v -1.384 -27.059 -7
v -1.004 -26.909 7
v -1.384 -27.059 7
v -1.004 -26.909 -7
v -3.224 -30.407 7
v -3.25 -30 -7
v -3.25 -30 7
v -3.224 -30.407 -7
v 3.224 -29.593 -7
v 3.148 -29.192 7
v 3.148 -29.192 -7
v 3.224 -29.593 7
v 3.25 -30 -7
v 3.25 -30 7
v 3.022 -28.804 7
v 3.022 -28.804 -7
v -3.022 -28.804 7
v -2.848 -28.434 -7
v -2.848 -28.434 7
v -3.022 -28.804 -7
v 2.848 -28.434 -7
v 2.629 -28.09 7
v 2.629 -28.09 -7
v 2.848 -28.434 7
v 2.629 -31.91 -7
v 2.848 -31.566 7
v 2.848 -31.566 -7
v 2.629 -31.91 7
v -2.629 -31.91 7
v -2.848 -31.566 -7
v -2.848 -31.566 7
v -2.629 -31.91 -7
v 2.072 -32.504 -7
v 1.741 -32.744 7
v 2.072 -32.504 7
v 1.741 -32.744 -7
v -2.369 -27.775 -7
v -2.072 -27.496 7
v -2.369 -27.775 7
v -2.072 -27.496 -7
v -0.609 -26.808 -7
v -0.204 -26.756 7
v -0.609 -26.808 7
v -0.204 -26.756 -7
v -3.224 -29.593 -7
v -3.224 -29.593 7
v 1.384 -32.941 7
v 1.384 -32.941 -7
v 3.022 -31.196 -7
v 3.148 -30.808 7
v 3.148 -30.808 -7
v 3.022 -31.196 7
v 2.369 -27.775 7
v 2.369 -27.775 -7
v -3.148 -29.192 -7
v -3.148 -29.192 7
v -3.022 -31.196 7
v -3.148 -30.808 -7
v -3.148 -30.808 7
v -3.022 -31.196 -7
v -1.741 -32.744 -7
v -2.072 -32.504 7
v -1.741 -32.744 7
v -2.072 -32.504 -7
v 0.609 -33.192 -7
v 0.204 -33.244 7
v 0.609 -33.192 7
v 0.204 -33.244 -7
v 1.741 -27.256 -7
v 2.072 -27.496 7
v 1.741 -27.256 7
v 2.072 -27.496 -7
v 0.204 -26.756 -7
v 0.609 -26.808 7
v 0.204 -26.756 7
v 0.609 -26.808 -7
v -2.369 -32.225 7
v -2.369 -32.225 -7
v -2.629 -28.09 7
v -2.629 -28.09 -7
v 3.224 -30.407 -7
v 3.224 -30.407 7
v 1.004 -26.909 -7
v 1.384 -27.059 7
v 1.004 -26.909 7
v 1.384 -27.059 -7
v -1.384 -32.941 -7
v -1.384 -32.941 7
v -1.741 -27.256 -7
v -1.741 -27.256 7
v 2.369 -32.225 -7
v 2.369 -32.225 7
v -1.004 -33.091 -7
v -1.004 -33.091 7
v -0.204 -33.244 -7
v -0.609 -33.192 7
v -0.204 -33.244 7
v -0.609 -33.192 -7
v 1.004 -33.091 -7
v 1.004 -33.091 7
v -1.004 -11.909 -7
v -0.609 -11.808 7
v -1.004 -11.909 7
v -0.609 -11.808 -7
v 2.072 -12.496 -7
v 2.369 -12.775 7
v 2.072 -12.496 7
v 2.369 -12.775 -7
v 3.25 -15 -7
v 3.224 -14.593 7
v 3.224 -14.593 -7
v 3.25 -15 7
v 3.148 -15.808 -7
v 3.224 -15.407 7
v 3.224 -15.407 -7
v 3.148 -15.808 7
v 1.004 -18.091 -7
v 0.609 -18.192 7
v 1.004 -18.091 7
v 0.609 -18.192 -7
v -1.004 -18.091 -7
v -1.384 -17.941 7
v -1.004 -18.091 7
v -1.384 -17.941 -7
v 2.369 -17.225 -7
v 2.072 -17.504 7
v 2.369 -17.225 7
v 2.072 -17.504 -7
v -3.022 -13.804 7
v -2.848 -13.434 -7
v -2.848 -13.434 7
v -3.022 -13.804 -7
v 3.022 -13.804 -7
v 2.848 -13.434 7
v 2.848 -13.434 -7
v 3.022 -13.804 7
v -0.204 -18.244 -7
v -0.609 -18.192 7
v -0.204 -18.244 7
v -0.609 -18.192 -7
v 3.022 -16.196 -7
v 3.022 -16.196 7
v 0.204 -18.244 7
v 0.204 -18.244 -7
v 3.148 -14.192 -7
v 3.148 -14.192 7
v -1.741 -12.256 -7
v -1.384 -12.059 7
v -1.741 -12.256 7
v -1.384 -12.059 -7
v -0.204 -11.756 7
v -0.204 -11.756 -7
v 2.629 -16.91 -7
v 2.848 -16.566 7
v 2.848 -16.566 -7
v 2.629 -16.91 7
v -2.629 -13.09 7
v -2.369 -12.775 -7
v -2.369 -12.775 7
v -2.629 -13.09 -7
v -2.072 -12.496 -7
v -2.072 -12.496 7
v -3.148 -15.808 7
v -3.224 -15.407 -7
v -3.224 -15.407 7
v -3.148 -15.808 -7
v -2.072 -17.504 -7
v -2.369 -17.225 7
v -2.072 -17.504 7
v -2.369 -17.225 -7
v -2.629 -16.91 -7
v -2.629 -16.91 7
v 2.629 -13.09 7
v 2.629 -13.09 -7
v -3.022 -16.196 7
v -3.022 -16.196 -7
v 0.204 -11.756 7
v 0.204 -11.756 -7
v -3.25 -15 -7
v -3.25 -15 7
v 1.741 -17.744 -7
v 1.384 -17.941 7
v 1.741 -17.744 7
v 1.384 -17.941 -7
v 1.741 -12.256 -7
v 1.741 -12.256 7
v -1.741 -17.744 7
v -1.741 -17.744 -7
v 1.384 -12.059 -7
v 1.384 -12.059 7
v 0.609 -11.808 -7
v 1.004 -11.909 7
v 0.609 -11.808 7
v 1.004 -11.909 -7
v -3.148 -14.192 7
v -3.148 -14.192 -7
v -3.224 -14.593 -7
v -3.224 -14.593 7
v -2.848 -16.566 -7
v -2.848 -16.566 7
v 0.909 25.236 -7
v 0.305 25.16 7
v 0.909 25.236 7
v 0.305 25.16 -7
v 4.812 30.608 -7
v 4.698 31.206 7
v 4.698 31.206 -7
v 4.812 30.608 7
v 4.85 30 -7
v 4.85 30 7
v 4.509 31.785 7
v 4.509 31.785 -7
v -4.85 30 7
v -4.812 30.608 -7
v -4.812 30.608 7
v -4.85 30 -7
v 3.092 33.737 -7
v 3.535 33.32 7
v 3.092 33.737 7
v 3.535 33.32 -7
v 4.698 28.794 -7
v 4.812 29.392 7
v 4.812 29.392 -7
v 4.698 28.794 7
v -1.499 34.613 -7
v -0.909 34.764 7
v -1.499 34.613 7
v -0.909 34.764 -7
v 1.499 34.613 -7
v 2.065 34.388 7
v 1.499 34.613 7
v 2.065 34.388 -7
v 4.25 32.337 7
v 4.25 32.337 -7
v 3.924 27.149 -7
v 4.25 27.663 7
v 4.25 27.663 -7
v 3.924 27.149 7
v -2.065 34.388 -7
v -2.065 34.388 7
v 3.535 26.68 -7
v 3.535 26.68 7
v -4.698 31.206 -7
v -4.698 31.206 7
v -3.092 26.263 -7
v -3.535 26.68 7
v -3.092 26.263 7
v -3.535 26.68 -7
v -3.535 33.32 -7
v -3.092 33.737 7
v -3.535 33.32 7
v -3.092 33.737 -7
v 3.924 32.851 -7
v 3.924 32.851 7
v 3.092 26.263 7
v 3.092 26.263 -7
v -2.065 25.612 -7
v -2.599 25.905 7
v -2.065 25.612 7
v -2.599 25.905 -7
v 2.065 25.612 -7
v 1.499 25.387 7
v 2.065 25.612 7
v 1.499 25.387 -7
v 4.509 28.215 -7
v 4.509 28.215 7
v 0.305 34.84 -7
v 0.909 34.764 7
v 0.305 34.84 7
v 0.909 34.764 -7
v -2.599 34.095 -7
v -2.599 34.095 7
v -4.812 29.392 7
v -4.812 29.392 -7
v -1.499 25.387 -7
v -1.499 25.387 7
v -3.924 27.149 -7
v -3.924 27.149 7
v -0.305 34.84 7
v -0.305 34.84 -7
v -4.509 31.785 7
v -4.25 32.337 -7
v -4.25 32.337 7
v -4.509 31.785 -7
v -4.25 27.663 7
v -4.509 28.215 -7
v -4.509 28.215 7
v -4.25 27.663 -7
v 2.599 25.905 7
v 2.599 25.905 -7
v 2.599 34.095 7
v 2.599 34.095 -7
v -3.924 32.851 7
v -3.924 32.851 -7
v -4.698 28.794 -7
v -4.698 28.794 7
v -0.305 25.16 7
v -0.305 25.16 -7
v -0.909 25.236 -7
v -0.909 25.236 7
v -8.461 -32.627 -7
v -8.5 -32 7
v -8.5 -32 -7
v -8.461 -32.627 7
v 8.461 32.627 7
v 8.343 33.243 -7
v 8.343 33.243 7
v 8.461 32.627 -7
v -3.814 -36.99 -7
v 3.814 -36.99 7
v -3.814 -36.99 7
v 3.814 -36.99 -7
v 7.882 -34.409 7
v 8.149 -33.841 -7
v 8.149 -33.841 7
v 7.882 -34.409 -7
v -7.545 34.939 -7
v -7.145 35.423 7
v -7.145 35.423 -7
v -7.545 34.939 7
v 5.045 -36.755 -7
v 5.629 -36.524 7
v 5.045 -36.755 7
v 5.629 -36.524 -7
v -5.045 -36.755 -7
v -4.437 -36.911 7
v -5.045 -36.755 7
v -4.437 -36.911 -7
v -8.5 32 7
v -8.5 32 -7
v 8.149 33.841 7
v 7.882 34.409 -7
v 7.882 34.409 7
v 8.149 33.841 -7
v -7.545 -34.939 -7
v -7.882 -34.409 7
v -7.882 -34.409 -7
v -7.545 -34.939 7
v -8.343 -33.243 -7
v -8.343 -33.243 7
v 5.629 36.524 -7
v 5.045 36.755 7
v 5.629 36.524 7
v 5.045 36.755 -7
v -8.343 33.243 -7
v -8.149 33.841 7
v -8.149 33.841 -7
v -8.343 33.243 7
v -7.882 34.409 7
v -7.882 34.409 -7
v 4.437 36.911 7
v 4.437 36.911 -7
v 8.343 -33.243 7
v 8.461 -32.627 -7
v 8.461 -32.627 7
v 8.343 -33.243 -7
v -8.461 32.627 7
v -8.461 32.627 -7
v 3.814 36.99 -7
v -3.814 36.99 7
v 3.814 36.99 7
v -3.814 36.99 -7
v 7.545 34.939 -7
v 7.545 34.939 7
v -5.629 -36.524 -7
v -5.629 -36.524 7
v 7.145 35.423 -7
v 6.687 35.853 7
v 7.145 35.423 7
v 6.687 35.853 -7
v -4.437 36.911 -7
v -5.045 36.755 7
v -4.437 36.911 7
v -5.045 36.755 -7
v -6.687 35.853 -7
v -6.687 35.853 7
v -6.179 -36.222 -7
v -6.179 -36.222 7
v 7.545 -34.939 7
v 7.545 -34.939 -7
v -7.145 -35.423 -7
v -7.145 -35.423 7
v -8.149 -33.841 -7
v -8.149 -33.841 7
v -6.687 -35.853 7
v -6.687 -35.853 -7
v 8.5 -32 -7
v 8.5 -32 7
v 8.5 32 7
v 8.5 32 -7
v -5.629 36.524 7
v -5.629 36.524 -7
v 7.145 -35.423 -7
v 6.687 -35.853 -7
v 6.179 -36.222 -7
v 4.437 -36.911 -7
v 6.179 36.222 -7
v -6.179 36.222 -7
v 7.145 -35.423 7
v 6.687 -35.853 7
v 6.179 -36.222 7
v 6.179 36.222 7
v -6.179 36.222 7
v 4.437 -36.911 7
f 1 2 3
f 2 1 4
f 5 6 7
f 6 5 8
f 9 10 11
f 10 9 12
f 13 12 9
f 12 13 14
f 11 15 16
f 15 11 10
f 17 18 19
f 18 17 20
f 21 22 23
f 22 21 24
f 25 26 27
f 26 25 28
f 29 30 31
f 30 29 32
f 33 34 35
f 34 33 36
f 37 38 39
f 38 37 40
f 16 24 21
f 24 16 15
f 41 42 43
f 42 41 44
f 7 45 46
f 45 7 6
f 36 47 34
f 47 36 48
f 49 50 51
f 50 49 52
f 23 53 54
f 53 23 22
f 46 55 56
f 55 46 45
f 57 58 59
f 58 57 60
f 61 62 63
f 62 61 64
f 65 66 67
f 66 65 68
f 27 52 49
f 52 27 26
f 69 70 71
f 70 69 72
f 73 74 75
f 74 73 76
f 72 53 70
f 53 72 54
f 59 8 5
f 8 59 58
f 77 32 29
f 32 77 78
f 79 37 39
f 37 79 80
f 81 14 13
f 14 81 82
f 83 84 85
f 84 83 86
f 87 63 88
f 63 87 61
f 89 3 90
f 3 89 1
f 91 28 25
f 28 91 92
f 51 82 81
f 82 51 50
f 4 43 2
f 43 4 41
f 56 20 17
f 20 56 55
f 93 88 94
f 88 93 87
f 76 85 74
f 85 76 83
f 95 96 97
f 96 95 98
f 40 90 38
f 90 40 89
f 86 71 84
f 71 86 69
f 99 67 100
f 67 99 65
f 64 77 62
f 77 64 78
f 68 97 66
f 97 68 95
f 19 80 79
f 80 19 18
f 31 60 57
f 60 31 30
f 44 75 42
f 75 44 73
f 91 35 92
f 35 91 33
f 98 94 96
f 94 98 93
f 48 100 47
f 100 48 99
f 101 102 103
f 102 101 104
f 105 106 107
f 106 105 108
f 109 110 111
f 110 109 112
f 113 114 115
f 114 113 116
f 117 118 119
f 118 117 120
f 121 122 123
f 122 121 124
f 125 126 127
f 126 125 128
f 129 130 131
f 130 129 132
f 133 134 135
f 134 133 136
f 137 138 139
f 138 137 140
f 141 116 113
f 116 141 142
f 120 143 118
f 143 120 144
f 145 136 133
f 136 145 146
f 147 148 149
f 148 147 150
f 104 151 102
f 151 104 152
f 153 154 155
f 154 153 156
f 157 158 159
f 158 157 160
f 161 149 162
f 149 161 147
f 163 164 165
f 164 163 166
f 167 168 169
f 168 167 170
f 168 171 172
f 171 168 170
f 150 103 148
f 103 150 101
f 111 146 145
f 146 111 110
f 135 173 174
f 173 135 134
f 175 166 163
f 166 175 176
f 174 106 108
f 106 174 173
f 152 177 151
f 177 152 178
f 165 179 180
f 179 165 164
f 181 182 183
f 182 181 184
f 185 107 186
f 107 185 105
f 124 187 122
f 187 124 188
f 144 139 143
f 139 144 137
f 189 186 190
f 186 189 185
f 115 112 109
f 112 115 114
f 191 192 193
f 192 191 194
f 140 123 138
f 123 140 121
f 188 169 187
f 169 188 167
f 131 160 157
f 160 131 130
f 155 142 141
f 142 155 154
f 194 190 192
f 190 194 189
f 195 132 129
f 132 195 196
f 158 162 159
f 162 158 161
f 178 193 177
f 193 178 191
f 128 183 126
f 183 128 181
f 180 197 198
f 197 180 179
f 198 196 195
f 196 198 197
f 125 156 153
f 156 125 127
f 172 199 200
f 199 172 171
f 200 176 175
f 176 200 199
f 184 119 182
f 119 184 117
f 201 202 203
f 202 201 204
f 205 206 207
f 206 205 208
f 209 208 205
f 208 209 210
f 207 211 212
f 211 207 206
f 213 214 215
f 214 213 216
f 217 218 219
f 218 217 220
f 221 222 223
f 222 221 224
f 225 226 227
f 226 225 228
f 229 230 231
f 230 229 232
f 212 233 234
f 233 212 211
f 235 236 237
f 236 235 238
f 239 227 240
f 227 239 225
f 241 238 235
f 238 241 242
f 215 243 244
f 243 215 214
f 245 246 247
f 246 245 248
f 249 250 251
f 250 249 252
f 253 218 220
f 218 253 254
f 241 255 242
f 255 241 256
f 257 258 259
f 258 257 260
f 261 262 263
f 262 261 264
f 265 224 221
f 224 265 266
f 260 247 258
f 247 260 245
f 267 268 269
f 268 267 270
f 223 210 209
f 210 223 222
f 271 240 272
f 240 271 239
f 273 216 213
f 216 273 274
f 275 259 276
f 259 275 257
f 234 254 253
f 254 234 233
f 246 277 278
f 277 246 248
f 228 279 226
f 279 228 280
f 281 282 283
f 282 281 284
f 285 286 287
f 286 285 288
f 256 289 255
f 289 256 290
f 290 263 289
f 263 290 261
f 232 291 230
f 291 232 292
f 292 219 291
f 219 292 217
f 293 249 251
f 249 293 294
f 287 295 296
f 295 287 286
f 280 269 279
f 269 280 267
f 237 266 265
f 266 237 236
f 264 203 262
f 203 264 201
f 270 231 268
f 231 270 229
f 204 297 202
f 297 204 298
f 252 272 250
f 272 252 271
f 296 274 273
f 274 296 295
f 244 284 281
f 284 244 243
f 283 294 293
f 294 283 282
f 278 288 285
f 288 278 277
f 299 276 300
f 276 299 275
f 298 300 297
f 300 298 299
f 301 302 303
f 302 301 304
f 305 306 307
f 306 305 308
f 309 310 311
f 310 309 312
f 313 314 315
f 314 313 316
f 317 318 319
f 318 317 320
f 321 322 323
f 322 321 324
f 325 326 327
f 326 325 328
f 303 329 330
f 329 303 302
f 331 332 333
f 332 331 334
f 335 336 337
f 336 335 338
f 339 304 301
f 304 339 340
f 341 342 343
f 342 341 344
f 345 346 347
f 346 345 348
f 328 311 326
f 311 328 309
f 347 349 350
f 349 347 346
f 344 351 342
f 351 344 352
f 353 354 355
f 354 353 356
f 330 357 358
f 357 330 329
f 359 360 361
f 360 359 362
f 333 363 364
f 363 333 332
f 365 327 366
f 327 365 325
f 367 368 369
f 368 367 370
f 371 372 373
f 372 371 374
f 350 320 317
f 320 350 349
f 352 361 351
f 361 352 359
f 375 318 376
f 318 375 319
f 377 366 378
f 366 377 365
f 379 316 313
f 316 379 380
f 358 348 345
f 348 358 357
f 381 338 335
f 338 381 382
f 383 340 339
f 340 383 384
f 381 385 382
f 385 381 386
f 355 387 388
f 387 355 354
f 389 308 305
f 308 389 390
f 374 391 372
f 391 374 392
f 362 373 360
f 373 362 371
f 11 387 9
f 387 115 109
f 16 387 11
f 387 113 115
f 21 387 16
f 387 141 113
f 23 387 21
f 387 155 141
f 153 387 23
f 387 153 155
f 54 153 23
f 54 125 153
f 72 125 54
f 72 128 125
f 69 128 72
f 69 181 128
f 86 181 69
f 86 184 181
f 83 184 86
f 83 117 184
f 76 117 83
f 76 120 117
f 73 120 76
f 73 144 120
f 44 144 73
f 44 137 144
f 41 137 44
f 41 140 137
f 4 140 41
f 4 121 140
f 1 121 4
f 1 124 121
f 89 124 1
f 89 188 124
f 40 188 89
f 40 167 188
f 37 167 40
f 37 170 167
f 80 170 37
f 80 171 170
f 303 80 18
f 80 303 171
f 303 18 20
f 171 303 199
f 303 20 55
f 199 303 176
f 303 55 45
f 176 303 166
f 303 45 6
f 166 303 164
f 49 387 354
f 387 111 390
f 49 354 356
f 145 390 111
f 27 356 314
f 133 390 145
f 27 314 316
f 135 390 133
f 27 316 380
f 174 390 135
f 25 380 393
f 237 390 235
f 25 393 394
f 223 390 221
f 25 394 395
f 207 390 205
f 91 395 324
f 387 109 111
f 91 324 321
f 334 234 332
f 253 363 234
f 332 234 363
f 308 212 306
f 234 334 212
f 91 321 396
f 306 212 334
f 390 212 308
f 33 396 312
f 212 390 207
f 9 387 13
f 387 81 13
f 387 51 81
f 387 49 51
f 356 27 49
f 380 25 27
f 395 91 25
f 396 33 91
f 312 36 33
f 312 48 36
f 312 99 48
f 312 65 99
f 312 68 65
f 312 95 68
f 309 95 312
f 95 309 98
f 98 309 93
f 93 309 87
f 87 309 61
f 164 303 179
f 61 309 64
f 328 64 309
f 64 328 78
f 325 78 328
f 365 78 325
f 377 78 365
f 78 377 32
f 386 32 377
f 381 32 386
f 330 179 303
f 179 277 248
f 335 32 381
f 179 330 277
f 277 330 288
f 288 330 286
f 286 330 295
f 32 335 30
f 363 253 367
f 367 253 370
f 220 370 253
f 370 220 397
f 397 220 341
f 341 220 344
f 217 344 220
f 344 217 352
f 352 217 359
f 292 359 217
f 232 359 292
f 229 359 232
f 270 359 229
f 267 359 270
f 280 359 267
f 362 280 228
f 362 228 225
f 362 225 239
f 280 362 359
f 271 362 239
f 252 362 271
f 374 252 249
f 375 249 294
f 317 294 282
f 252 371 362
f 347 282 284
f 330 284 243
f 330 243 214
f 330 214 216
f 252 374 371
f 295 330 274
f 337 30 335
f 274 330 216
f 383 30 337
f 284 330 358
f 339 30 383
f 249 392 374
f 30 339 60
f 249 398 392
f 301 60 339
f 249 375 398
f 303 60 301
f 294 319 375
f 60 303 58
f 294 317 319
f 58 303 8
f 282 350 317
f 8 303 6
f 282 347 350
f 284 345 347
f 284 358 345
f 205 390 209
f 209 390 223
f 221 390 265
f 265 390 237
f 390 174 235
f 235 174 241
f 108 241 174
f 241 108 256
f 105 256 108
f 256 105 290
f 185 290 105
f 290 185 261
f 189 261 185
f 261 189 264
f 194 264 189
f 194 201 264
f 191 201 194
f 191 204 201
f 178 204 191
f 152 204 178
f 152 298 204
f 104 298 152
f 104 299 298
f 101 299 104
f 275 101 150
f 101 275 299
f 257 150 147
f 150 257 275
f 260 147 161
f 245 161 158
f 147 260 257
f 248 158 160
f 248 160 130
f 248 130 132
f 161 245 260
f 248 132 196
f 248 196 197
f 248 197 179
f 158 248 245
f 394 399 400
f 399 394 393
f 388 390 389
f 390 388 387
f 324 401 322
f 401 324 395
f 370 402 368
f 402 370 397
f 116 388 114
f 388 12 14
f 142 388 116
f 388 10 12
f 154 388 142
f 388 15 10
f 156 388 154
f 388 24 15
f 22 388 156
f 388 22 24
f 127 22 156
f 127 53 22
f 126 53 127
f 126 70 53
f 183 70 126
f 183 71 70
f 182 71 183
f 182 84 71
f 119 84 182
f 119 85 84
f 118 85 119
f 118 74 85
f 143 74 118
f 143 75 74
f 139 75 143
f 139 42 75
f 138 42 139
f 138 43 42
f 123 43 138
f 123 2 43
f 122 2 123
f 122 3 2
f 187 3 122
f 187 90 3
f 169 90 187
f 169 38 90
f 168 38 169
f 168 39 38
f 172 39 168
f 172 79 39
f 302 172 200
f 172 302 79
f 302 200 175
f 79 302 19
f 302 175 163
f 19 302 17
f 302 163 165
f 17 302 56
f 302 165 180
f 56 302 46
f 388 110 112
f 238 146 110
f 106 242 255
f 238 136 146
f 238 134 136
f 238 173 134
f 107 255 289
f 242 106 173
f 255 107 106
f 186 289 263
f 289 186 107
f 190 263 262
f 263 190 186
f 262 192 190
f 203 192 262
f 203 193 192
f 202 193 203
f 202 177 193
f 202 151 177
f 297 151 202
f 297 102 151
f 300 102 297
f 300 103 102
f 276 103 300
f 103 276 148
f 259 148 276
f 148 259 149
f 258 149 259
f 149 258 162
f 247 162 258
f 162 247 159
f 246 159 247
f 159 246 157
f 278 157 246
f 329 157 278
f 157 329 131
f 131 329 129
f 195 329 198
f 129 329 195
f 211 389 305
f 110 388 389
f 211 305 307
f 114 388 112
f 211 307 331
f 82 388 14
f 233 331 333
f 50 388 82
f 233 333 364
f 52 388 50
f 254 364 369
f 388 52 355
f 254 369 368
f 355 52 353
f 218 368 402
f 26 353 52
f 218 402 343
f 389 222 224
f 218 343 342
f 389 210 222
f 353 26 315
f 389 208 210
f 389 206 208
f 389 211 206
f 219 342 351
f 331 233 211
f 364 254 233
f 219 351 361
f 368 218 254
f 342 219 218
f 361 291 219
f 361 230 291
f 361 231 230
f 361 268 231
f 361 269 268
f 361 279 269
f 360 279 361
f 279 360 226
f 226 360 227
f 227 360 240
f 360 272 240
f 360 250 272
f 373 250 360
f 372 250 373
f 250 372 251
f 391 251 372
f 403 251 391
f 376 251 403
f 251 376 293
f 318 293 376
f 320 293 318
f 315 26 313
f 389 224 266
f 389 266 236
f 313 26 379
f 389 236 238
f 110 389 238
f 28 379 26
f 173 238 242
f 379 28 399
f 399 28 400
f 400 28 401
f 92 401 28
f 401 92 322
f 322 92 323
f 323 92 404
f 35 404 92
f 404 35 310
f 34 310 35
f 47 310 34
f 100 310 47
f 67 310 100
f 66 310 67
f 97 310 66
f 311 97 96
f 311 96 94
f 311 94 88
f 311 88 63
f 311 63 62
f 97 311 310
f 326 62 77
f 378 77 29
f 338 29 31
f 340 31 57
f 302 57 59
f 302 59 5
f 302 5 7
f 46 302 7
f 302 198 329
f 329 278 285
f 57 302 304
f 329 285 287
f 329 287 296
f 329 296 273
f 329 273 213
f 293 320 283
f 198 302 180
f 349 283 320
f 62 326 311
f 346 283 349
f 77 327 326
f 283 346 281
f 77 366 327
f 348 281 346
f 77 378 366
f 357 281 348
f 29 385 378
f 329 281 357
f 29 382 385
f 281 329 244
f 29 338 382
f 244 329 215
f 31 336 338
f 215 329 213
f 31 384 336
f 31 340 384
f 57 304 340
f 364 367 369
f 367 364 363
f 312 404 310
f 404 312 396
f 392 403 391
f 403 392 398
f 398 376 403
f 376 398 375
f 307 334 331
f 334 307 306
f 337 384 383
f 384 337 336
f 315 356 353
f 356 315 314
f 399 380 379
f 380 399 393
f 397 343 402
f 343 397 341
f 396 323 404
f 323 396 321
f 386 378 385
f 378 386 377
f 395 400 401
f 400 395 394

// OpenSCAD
$fn = 50;


difference() {
	union() {
		translate(v = [0, 0, -7.0000000000]) {
			hull() {
				translate(v = [-3.5000000000, 32.0000000000, 0]) {
					cylinder(h = 14, r = 5);
				}
				translate(v = [3.5000000000, 32.0000000000, 0]) {
					cylinder(h = 14, r = 5);
				}
				translate(v = [-3.5000000000, -32.0000000000, 0]) {
					cylinder(h = 14, r = 5);
				}
				translate(v = [3.5000000000, -32.0000000000, 0]) {
					cylinder(h = 14, r = 5);
				}
			}
		}
	}
	union() {
		translate(v = [0.0000000000, -30.0000000000, -50.0000000000]) {
			cylinder(h = 100, r = 3.2500000000);
		}
		translate(v = [0.0000000000, -15.0000000000, -50.0000000000]) {
			cylinder(h = 100, r = 3.2500000000);
		}
		translate(v = [0, 30, -50.0000000000]) {
			cylinder(h = 100, r = 4.8500000000);
		}
	}
}
